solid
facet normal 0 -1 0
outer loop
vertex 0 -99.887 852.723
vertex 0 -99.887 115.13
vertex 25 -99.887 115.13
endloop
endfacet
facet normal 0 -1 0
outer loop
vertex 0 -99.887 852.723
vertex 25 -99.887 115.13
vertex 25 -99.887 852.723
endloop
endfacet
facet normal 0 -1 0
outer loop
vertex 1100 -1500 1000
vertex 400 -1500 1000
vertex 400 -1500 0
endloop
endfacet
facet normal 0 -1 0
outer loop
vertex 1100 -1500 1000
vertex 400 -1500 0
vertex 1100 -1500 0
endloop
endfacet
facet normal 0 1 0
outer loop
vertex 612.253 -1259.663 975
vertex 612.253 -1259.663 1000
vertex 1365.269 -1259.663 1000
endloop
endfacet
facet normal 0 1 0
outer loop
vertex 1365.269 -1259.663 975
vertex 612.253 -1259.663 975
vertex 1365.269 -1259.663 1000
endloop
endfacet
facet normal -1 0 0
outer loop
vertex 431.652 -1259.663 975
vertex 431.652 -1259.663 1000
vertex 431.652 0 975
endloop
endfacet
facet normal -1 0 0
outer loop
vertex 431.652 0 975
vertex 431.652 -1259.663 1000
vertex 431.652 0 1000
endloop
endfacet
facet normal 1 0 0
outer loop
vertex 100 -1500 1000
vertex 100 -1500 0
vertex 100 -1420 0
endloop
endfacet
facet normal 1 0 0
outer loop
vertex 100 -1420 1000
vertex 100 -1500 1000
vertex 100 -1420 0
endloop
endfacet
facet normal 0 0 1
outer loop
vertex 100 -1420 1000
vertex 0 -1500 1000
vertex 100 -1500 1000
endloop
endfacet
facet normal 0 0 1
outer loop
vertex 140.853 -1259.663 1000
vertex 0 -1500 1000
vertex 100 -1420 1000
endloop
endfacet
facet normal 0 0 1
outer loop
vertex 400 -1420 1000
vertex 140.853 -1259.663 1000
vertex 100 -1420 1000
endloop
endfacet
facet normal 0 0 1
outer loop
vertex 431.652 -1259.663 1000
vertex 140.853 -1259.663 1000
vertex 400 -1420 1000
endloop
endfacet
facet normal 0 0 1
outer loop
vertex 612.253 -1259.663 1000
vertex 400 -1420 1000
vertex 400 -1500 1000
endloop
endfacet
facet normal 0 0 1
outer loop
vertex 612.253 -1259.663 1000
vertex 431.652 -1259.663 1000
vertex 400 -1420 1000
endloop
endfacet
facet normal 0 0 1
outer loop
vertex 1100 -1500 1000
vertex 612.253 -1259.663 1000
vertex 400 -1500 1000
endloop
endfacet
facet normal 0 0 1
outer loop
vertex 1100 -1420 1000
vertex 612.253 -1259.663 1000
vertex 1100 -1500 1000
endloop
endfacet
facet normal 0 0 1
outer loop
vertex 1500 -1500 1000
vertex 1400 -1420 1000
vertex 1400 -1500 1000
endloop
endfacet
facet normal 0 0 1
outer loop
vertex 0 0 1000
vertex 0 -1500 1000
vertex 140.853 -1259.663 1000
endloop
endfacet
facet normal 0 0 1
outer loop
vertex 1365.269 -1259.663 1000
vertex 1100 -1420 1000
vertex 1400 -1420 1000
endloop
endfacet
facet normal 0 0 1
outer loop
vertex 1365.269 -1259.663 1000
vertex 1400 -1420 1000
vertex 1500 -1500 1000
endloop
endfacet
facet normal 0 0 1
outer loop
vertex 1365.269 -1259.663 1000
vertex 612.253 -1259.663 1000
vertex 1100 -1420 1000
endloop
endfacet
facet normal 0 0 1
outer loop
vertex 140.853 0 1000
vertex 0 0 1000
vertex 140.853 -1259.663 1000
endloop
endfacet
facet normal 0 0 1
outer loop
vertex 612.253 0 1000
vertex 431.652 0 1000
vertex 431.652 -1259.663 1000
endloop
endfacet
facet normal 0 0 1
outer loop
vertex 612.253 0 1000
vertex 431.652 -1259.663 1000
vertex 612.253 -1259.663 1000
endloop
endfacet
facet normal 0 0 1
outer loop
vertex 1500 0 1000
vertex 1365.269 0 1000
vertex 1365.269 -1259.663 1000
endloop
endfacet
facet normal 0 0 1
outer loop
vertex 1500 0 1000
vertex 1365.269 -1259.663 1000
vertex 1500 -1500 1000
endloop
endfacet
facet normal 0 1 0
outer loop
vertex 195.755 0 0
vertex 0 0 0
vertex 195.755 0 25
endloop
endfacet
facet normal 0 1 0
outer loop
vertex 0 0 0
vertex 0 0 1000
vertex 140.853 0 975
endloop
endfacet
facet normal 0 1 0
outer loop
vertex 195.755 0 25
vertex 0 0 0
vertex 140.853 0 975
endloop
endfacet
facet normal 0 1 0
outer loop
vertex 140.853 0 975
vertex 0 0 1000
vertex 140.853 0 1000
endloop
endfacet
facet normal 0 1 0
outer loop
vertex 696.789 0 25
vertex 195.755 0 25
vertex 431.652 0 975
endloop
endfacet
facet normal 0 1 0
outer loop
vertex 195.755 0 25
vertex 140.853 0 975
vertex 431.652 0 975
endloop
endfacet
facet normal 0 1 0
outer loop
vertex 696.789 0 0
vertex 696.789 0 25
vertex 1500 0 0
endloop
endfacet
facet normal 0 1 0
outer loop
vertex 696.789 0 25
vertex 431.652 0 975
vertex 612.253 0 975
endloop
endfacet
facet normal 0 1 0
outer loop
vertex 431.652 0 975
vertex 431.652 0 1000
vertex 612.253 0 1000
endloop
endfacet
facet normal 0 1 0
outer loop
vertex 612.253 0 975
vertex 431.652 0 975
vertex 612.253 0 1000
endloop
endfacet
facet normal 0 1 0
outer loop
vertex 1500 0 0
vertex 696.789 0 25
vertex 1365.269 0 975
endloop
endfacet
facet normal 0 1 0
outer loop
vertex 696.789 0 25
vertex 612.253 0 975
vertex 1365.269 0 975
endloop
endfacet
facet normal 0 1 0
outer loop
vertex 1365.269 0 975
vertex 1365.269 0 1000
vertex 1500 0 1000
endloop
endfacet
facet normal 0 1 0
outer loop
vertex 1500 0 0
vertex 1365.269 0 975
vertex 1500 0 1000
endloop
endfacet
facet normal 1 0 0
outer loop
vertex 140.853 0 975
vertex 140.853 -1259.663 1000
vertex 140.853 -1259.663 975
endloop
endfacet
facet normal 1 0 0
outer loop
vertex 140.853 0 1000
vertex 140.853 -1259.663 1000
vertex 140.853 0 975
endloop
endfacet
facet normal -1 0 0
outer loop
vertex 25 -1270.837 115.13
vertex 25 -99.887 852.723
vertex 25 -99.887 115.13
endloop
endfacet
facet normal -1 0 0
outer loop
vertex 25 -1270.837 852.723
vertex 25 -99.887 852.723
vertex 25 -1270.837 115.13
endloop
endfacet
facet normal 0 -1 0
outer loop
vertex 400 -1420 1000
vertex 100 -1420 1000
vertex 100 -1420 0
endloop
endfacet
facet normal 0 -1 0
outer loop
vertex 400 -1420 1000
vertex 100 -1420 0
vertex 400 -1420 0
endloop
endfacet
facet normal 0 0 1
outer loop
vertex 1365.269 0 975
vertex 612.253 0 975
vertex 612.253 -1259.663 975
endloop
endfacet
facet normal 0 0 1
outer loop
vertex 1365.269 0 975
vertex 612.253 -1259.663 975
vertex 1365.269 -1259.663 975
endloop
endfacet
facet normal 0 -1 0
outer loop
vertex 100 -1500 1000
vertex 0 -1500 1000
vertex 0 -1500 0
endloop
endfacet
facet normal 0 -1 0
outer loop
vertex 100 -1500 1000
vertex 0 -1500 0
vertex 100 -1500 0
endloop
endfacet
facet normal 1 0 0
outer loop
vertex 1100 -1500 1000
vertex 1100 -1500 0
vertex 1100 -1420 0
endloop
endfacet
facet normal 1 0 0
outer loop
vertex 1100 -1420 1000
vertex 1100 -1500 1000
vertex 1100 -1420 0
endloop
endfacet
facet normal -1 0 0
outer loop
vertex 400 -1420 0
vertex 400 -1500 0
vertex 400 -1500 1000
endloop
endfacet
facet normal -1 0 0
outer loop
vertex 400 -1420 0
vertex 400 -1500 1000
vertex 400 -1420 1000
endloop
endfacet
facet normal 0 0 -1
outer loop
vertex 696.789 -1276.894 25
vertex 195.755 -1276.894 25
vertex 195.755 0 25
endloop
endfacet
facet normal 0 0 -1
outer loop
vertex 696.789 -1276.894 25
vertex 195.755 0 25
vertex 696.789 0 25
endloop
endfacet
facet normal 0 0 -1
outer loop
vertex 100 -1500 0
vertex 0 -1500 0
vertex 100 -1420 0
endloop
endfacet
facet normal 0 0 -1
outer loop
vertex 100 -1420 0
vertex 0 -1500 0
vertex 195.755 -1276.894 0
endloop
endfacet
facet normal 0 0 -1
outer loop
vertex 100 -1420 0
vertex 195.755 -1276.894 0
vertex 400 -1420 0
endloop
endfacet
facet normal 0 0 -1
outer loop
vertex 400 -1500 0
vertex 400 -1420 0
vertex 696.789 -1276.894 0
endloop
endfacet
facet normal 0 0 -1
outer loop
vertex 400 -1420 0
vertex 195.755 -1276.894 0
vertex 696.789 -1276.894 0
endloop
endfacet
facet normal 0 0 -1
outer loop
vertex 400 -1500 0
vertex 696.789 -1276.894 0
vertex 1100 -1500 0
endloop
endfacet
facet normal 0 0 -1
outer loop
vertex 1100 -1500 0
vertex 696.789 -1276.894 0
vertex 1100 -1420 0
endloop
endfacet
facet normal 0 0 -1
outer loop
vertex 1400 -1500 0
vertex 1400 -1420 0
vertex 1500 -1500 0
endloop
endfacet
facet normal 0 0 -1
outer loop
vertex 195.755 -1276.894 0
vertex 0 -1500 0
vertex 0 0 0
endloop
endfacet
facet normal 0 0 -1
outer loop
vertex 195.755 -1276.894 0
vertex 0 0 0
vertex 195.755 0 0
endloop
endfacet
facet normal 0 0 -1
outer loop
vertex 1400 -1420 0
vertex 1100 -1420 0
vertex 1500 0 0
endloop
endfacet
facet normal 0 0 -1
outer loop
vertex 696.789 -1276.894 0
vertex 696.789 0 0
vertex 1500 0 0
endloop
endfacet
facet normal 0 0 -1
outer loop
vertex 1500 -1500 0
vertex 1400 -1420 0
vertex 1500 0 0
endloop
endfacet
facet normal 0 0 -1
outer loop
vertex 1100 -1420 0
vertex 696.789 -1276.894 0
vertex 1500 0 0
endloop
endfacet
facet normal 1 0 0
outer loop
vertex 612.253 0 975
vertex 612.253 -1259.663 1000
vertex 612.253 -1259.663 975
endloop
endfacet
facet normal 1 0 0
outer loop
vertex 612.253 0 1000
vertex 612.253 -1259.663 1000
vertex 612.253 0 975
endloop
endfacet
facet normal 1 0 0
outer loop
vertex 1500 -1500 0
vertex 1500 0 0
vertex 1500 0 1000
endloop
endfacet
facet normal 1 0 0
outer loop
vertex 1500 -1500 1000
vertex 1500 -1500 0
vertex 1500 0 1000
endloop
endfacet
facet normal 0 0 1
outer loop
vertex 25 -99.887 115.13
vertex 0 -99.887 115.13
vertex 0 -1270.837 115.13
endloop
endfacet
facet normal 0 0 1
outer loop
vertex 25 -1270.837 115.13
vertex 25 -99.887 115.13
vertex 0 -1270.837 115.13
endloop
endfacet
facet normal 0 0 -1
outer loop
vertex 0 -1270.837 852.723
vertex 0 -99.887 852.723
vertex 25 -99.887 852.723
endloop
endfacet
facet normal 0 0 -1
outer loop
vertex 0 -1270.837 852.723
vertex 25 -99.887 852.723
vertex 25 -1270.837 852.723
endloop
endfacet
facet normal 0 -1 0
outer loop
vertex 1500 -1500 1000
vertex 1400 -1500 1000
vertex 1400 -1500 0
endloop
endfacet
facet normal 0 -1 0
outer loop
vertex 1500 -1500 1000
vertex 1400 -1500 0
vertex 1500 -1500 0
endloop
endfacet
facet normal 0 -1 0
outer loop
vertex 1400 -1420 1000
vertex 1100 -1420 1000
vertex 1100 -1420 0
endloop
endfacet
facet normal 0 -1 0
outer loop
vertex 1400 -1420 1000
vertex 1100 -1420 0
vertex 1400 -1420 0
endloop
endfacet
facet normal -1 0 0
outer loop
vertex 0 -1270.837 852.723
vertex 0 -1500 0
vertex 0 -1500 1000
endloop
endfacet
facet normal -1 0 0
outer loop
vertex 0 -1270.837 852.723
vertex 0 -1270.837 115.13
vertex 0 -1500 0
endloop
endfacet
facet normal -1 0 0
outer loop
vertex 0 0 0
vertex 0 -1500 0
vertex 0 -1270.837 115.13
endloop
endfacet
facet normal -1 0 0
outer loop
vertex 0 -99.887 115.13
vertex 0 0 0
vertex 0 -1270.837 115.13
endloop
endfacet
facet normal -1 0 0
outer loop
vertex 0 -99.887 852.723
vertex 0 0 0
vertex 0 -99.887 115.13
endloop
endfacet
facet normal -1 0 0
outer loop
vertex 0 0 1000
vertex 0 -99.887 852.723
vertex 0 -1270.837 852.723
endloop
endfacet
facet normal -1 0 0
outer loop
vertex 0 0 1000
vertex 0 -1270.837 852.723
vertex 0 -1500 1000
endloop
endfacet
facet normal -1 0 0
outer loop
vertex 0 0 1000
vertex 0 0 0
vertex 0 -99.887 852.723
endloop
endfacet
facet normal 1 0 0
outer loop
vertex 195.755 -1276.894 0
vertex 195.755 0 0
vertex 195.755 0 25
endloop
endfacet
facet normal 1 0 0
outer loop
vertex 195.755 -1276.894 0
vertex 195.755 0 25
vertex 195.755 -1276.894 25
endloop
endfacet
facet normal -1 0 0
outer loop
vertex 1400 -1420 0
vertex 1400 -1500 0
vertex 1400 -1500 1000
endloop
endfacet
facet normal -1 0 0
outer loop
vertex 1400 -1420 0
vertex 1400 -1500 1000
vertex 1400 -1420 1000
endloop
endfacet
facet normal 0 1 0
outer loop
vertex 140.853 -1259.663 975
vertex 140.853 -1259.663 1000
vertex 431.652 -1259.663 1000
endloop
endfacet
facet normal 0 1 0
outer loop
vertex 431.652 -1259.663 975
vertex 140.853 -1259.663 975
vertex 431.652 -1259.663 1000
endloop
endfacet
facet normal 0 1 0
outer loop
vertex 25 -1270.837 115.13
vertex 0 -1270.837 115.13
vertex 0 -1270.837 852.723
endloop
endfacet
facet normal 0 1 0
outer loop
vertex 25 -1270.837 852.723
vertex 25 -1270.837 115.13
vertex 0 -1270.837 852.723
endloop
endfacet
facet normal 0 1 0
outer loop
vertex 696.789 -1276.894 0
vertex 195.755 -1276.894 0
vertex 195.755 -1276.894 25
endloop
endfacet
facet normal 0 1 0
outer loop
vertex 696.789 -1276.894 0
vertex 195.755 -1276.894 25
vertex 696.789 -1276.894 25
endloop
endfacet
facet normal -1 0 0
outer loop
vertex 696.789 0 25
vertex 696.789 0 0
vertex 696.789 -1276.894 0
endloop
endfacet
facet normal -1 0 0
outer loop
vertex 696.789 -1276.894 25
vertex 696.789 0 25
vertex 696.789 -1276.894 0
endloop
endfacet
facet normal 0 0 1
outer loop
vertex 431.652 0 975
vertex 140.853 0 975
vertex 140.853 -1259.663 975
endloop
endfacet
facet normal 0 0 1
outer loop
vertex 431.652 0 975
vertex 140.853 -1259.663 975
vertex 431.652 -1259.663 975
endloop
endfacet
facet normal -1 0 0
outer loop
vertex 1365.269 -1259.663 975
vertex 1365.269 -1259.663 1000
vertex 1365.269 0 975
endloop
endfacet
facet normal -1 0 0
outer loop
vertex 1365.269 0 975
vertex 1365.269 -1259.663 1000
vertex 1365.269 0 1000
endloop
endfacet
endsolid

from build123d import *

# Parameters (mm, degrees)
F0_W     = 1500
F0_H     = 1000
F1_DEPTH = 1500
F2_W     = 300
F2_H     = 80
F3_DEPTH = 1000
F4_W     = 290.798738
F4_H     = 1259.663105
F4_W_2   = 753.015757
F5_DEPTH = 25
F6_W     = 1170.94978
F6_H     = 737.592996
F7_DEPTH = 25
F8_W     = 501.033828
F8_H     = 1276.894093
F9_DEPTH = 25


with BuildPart() as f1:
    # F0 (on Front) → F1 (new body)
    with BuildSketch(Plane.XZ):
        with Locations((750, 500)):
            Rectangle(F0_W, F0_H)
    extrude(amount=F1_DEPTH)

    # F2 (on face) → F3 (cut)
    with BuildSketch(Plane.XY.offset(1000)):
        with Locations((250, -1460)):
            Rectangle(F2_W, F2_H)
        with Locations((1250, -1460)):
            Rectangle(F2_W, F2_H)
    extrude(amount=-F3_DEPTH, mode=Mode.SUBTRACT)

    # F4 (on face) → F5 (cut)
    with BuildSketch(Plane.XY.offset(1000)):
        with Locations((286.252491, -629.831552)):
            Rectangle(F4_W, F4_H)
        with Locations((988.761067, -629.831552)):
            Rectangle(F4_W_2, F4_H)
    extrude(amount=-F5_DEPTH, mode=Mode.SUBTRACT)

    # F6 (on face) → F7 (cut)
    with BuildSketch(Plane(origin=(0, 0, 0), x_dir=(0, -1, 0), z_dir=(-1, 0, 0))):
        with Locations((685.361821, 483.926624)):
            Rectangle(F6_W, F6_H)
    extrude(amount=-F7_DEPTH, mode=Mode.SUBTRACT)

    # F8 (on face) → F9 (cut)
    with BuildSketch(Plane(origin=(0, 0, 0), x_dir=(1, 0, 0), z_dir=(0, 0, -1))):
        with Locations((446.271874, 638.447046)):
            Rectangle(F8_W, F8_H)
    extrude(amount=-F9_DEPTH, mode=Mode.SUBTRACT)


solid = f1.part
